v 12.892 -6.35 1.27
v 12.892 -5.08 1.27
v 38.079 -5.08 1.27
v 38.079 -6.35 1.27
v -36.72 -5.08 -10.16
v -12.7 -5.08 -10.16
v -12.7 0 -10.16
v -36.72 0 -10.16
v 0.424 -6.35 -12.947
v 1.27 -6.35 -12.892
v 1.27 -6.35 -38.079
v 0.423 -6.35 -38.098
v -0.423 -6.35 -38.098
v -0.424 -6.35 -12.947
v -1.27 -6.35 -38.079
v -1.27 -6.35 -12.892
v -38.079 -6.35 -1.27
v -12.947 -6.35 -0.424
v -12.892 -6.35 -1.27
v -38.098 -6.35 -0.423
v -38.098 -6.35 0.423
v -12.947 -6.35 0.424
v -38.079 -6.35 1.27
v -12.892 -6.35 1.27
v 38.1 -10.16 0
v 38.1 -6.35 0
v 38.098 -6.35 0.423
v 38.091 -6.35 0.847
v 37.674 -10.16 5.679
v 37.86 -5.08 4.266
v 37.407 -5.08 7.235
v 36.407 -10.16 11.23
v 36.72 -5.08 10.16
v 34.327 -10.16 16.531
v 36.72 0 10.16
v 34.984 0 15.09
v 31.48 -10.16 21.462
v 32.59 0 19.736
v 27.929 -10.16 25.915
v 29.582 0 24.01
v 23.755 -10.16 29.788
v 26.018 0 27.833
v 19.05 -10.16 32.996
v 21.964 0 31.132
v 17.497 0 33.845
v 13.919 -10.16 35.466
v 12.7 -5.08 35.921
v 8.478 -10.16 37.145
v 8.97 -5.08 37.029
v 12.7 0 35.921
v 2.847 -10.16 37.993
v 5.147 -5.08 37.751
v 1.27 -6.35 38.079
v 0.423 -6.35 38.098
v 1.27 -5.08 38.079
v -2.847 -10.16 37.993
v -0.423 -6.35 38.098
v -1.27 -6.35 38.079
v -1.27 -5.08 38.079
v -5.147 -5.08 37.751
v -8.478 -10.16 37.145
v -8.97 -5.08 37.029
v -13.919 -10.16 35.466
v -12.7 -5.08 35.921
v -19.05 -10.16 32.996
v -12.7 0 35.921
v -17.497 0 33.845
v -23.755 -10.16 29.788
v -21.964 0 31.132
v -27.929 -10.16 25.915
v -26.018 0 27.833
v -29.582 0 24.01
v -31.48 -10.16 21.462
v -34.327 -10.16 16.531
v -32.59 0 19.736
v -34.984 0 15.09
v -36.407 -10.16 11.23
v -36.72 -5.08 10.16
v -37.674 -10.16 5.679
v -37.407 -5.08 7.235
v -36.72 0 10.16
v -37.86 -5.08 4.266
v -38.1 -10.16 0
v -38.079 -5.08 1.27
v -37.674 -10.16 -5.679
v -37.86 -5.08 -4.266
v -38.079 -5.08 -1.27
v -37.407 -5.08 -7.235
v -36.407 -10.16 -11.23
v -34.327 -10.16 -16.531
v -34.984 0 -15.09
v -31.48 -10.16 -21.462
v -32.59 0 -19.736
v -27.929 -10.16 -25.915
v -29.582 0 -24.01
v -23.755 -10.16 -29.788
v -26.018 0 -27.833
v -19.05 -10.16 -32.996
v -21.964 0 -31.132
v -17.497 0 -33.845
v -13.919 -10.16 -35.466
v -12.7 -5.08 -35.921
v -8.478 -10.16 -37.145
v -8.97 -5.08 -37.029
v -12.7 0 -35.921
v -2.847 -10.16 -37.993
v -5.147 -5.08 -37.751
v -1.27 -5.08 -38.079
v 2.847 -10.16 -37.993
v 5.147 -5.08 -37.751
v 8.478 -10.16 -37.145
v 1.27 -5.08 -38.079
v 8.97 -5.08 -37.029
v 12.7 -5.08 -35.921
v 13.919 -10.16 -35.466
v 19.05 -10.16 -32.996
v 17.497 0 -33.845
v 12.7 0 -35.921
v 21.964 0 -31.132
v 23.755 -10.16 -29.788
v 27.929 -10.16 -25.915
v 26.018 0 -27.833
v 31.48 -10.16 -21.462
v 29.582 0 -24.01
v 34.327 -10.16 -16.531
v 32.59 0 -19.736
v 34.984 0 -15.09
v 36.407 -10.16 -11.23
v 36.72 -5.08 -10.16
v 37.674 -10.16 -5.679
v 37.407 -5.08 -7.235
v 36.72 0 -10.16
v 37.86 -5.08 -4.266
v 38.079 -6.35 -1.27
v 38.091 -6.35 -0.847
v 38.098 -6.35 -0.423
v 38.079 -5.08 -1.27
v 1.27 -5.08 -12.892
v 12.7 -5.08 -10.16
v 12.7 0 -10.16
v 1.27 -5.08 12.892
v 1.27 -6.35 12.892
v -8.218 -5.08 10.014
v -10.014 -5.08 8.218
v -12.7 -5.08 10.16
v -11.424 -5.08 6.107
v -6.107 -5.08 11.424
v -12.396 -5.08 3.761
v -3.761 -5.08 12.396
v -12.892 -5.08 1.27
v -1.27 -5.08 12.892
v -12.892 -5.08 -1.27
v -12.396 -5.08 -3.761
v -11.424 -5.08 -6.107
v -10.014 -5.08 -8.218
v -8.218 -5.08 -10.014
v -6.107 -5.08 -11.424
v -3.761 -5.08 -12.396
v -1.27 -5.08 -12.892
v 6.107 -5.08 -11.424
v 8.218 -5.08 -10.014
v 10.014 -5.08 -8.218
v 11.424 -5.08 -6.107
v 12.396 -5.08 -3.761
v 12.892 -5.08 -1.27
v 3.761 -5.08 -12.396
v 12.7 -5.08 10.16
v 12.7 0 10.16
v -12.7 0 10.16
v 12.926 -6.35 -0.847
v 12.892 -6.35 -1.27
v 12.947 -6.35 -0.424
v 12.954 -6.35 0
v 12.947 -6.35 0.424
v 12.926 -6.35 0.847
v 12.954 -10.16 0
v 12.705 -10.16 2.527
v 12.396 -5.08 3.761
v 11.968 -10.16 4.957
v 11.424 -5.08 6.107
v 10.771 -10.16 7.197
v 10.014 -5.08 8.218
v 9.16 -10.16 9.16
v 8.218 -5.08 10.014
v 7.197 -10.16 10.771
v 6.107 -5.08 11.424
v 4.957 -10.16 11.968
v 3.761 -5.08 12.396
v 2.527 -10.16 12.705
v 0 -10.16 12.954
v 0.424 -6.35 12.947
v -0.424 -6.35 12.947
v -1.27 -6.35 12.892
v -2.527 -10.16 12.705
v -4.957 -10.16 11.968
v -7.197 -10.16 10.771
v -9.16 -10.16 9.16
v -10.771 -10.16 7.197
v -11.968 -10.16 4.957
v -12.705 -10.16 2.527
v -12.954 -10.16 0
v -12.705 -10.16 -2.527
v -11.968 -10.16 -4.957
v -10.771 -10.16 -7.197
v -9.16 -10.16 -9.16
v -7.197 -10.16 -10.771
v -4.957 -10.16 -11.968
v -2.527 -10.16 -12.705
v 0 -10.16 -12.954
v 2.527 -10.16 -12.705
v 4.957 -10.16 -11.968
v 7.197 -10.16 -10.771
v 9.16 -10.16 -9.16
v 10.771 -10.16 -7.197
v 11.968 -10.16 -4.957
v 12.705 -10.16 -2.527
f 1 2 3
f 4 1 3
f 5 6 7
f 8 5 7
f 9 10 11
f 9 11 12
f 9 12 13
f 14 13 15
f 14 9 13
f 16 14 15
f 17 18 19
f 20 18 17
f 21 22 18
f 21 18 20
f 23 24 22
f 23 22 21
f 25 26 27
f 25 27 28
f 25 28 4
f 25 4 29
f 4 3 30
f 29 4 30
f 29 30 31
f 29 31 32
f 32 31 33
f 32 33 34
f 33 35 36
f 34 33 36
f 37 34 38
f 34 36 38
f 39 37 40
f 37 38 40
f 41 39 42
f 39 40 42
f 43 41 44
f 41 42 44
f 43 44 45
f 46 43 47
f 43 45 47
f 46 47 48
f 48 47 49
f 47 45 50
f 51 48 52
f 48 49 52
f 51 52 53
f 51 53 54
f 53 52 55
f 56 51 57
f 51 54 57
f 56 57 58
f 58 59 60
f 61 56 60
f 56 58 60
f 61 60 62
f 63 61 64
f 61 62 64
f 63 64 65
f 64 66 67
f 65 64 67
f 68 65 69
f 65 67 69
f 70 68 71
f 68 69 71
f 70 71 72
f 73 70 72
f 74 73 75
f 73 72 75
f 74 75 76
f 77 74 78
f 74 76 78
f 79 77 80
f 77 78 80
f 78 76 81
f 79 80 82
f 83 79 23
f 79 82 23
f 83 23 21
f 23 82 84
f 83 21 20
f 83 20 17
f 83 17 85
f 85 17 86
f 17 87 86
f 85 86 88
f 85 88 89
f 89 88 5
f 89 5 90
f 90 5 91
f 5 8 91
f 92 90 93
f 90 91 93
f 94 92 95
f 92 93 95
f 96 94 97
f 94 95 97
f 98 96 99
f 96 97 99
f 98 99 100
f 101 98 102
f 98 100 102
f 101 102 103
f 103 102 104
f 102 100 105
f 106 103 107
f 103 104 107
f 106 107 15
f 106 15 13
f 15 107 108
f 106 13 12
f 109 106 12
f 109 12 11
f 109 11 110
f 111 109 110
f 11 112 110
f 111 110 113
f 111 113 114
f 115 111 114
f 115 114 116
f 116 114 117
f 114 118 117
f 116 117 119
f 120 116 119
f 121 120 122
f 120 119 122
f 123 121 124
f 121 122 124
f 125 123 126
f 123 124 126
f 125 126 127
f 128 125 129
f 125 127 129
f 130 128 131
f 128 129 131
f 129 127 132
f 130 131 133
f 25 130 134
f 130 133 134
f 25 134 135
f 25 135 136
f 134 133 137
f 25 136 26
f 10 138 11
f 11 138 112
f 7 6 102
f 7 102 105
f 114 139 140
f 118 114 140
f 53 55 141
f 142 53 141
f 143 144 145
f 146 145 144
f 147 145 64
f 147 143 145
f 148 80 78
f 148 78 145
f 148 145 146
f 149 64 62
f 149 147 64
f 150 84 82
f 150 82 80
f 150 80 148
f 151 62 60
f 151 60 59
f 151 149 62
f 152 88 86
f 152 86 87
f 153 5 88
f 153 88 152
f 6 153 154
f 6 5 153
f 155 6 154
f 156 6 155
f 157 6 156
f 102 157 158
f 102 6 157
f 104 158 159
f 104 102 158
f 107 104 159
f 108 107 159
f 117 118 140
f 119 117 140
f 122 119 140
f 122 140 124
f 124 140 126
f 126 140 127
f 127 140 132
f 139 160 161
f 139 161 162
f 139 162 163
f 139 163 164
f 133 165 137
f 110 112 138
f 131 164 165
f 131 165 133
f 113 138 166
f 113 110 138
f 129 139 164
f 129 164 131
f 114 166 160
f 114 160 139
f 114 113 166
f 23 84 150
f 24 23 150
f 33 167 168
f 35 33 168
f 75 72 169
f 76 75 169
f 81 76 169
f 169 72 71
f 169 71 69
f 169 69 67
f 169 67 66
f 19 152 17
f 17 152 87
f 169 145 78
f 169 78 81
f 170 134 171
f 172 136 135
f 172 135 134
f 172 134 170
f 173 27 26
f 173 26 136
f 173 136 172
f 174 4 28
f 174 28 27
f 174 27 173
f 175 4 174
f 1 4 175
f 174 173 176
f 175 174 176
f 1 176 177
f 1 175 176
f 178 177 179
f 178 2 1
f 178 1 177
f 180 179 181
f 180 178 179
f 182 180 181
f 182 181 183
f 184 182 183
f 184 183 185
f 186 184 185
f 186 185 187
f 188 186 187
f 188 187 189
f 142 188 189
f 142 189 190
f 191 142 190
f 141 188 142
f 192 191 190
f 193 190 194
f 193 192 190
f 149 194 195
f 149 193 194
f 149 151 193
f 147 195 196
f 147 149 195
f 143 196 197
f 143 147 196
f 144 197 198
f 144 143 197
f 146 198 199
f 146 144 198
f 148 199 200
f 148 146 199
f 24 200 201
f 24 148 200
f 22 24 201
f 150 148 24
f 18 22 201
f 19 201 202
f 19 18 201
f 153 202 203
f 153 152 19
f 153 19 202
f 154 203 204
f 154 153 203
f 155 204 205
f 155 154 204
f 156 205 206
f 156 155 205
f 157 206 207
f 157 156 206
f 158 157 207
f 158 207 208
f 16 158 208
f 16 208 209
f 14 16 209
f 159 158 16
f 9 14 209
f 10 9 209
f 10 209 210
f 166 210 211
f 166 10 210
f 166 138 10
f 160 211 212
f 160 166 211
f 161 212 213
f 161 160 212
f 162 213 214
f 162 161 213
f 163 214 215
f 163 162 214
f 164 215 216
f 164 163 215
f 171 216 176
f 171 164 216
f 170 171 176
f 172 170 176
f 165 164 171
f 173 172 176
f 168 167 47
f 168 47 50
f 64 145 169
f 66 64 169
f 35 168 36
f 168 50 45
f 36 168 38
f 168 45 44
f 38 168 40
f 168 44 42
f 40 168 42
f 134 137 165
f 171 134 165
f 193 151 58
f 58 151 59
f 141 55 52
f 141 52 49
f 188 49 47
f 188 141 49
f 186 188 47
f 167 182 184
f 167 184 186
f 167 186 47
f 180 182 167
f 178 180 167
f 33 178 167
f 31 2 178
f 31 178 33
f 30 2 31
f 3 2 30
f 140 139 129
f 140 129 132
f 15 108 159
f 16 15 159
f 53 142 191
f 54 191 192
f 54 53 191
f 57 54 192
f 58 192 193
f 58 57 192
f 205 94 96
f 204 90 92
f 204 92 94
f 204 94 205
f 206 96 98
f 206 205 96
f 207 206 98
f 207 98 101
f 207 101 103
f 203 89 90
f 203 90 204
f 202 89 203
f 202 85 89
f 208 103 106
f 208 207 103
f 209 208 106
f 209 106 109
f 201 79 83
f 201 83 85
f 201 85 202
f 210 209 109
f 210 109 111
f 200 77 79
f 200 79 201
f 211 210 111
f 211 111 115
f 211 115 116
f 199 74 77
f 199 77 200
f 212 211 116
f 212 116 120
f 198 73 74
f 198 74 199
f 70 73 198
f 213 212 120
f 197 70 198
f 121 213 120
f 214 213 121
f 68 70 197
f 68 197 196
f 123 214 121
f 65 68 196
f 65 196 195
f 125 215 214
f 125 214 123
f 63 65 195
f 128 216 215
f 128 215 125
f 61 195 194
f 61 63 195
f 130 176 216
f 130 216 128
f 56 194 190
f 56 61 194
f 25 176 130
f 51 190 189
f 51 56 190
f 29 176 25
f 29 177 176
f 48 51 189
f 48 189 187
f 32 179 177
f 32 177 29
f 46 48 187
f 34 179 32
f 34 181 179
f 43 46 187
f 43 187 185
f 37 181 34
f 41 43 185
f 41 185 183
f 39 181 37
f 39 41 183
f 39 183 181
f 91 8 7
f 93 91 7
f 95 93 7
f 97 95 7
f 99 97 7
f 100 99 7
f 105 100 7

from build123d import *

# Parameters (mm, degrees)
F0_R          = 12.7
F1_DEPTH      = 17.78
F2_R          = 38.1
F3_DEPTH      = 10.16
F4_R          = 12.954
F5_DEPTH      = 17.781
F5_DEPTH_BACK = 115
F6_W          = 5.08
F6_H          = 20.32
F7_DEPTH      = 38.101
F7_DEPTH_BACK = 38.101
F8_W          = 25.4
F8_H          = 5.08
F9_DEPTH      = 38.101
F9_DEPTH_BACK = 38.101
F11_DEPTH     = 6.35


# Not quite as in the source:
# - an extrude ends at something that could not be found from the text; its depth is read off the source's solid


with BuildPart() as f1:
    # F0 (on Front) → F1 (new body)
    with BuildSketch(Plane.XZ):
        Circle(F0_R)
    extrude(amount=F1_DEPTH)

    # F2 (on Front) → F3 (join)
    with BuildSketch(Plane.XZ):
        Circle(F2_R)
    extrude(amount=F3_DEPTH)

    # F4 (on Front) → F5 (cut, two sides)
    with BuildSketch(Plane.XZ) as f5_sk:
        Circle(F4_R)
    extrude(amount=F5_DEPTH, mode=Mode.SUBTRACT)
    extrude(f5_sk.sketch, amount=-F5_DEPTH_BACK, mode=Mode.SUBTRACT)

    # F6 (on Right) → F7 (cut, two sides)
    with BuildSketch(Plane.YZ) as f7_sk:
        with Locations((-2.54, 0)):
            Rectangle(F6_W, F6_H)
    extrude(amount=F7_DEPTH, mode=Mode.SUBTRACT)
    extrude(f7_sk.sketch, amount=-F7_DEPTH_BACK, mode=Mode.SUBTRACT)

    # F8 (on Top) → F9 (cut, two sides)
    with BuildSketch(Plane.XY) as f9_sk:
        with Locations((0, -2.54)):
            Rectangle(F8_W, F8_H)
    extrude(amount=-F9_DEPTH, mode=Mode.SUBTRACT)
    extrude(f9_sk.sketch, amount=F9_DEPTH_BACK, mode=Mode.SUBTRACT)

    # F10 (on face) → F11 (cut)
    with BuildSketch(Plane(origin=(0, 0, 0), x_dir=(-1, 0, 0), z_dir=(0, 1, 0))):
        with BuildLine():
            Line((1.27, -1.27), (38.0788274504, -1.27))
            ThreePointArc((38.0788274504, -1.27), (38.1, 0), (38.0788274504, 1.27))
            Line((38.0788274504, 1.27), (1.27, 1.27))
            Line((1.27, 1.27), (1.27, 38.0788274504))
            ThreePointArc((1.27, 38.0788274504), (0, 38.1), (-1.27, 38.0788274504))
            Line((-1.27, 38.0788274504), (-1.27, 1.27))
            Line((-1.27, 1.27), (-38.0788274504, 1.27))
            ThreePointArc((-38.0788274504, 1.27), (-38.1, 0), (-38.0788274504, -1.27))
            Line((-38.0788274504, -1.27), (-1.27, -1.27))
            Line((-1.27, -1.27), (-1.27, -38.0788274504))
            ThreePointArc((-1.27, -38.0788274504), (0, -38.1), (1.27, -38.0788274504))
            Line((1.27, -38.0788274504), (1.27, -1.27))
        make_face()
    extrude(amount=-F11_DEPTH, mode=Mode.SUBTRACT)


solid = f1.part
